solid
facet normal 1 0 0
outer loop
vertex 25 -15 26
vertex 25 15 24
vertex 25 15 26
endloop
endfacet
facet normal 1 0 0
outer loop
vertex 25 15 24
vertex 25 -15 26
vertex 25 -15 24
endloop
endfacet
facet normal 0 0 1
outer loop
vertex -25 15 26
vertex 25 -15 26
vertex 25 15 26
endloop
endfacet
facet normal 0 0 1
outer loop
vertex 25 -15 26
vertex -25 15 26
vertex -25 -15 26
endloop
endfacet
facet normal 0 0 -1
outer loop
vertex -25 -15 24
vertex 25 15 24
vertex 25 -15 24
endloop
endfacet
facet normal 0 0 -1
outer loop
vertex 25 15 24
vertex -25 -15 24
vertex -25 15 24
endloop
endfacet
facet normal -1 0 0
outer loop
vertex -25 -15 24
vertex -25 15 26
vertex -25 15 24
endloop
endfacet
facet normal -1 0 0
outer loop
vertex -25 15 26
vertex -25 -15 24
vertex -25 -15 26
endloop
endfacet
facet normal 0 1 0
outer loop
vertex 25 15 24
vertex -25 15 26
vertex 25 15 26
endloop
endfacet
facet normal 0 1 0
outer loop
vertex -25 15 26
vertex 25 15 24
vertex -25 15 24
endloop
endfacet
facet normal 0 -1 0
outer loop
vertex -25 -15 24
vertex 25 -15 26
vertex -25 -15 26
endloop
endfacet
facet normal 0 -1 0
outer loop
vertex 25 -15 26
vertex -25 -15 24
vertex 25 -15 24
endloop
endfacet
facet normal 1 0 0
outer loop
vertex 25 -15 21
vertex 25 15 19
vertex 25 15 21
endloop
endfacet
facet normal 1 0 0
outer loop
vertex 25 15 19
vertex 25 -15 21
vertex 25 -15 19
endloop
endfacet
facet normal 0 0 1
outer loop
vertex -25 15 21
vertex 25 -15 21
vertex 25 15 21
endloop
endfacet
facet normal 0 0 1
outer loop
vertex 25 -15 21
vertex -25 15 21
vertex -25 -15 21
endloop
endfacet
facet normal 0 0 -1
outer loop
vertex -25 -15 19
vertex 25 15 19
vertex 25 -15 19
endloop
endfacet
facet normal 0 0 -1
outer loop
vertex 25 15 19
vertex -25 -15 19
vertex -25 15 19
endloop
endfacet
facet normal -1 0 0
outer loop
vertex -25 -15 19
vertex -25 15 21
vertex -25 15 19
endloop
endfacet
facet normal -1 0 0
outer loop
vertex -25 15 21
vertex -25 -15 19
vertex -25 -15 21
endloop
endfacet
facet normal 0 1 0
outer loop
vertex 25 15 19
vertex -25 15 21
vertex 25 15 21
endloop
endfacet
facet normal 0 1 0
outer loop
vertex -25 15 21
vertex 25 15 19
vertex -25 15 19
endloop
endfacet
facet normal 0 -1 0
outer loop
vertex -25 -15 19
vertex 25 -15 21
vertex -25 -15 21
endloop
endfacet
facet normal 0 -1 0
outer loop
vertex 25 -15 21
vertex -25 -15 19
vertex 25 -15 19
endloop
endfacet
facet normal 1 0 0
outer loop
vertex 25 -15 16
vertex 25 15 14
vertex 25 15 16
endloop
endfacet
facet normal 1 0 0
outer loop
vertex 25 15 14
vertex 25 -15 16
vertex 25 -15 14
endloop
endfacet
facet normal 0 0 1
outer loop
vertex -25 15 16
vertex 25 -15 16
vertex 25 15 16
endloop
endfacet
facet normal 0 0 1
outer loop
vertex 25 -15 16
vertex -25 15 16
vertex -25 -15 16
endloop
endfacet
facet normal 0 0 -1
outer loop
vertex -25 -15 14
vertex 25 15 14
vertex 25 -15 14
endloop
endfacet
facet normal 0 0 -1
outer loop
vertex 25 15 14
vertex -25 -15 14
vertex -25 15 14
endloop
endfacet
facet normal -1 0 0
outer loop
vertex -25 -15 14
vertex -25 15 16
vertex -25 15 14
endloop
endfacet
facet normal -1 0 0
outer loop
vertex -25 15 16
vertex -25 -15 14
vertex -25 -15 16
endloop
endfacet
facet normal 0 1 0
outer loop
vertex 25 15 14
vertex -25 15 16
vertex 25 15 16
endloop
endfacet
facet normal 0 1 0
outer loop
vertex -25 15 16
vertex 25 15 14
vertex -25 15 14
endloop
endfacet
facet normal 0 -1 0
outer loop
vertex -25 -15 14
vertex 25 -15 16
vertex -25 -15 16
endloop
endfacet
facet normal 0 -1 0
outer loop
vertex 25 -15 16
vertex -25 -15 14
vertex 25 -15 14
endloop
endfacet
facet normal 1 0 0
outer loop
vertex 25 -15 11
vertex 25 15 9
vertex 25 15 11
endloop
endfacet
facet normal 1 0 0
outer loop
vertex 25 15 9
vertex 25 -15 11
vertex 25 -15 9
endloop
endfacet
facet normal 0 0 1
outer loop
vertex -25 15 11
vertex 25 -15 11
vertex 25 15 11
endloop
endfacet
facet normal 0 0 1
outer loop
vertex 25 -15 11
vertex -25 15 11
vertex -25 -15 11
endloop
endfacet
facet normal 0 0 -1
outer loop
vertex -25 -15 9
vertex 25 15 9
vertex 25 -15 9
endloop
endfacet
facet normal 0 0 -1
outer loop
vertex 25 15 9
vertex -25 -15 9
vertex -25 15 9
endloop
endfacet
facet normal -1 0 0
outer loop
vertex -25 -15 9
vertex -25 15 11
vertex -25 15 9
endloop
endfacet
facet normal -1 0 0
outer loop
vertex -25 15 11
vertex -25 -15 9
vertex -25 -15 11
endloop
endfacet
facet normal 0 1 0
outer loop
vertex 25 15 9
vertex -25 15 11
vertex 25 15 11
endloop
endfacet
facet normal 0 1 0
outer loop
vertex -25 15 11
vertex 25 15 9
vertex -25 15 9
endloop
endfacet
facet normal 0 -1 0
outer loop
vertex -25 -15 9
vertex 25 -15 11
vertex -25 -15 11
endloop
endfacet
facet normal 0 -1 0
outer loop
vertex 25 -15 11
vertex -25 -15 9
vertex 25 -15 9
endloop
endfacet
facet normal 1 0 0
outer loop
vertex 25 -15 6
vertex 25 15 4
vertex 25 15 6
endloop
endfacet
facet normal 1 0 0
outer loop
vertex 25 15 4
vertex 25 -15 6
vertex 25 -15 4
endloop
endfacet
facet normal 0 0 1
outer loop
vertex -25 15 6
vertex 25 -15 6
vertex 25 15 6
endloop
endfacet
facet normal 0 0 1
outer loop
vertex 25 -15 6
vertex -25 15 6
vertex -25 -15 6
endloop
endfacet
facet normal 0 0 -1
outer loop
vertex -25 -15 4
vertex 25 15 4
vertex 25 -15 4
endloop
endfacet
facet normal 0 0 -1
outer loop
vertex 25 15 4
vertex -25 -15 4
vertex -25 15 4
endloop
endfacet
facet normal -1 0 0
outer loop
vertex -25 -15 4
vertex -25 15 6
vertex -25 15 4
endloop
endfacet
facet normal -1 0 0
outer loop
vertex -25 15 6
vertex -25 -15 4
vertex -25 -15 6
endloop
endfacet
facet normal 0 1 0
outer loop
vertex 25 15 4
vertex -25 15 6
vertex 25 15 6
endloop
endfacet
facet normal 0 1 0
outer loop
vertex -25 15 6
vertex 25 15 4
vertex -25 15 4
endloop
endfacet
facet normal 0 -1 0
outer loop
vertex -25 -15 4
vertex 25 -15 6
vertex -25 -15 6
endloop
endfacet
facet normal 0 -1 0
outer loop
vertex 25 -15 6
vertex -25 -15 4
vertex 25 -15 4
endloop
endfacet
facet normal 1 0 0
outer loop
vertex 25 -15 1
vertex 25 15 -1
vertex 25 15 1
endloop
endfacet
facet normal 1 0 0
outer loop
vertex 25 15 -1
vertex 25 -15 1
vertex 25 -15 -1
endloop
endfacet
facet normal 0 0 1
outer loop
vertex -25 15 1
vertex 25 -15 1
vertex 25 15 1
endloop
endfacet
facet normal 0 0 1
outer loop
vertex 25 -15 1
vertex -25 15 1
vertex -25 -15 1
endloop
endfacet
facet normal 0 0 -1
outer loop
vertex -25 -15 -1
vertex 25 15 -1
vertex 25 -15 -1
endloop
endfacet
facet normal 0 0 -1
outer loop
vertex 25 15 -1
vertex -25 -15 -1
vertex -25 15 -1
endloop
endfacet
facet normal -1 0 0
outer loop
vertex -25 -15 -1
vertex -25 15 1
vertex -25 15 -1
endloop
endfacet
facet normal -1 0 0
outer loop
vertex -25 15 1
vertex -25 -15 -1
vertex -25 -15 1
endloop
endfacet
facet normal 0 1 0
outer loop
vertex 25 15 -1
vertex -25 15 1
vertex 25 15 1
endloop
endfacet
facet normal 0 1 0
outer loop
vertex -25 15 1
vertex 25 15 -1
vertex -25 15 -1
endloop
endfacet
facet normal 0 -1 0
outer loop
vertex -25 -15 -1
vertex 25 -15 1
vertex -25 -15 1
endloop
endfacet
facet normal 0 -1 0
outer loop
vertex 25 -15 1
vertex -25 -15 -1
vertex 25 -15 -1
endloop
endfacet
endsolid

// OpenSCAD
// Parameters for the rectangular plate
plate_length = 50;  // Length of the plate
plate_width = 30;   // Width of the plate
plate_thickness = 2; // Thickness of the plate
plate_spacing = 5;  // Spacing between plates

// Function to create a rectangular plate
module rectangular_plate() {
    cube([plate_length, plate_width, plate_thickness], center = true);
}

// Generate the stacked plates
translate([0, 0, plate_spacing * 5]) rectangular_plate(); // Layer 1
translate([0, 0, plate_spacing * 4]) rectangular_plate(); // Layer 2
translate([0, 0, plate_spacing * 3]) rectangular_plate(); // Layer 3
translate([0, 0, plate_spacing * 2]) rectangular_plate(); // Layer 4
translate([0, 0, plate_spacing * 1]) rectangular_plate(); // Layer 5
translate([0, 0, plate_spacing * 0]) rectangular_plate(); // Layer 6
